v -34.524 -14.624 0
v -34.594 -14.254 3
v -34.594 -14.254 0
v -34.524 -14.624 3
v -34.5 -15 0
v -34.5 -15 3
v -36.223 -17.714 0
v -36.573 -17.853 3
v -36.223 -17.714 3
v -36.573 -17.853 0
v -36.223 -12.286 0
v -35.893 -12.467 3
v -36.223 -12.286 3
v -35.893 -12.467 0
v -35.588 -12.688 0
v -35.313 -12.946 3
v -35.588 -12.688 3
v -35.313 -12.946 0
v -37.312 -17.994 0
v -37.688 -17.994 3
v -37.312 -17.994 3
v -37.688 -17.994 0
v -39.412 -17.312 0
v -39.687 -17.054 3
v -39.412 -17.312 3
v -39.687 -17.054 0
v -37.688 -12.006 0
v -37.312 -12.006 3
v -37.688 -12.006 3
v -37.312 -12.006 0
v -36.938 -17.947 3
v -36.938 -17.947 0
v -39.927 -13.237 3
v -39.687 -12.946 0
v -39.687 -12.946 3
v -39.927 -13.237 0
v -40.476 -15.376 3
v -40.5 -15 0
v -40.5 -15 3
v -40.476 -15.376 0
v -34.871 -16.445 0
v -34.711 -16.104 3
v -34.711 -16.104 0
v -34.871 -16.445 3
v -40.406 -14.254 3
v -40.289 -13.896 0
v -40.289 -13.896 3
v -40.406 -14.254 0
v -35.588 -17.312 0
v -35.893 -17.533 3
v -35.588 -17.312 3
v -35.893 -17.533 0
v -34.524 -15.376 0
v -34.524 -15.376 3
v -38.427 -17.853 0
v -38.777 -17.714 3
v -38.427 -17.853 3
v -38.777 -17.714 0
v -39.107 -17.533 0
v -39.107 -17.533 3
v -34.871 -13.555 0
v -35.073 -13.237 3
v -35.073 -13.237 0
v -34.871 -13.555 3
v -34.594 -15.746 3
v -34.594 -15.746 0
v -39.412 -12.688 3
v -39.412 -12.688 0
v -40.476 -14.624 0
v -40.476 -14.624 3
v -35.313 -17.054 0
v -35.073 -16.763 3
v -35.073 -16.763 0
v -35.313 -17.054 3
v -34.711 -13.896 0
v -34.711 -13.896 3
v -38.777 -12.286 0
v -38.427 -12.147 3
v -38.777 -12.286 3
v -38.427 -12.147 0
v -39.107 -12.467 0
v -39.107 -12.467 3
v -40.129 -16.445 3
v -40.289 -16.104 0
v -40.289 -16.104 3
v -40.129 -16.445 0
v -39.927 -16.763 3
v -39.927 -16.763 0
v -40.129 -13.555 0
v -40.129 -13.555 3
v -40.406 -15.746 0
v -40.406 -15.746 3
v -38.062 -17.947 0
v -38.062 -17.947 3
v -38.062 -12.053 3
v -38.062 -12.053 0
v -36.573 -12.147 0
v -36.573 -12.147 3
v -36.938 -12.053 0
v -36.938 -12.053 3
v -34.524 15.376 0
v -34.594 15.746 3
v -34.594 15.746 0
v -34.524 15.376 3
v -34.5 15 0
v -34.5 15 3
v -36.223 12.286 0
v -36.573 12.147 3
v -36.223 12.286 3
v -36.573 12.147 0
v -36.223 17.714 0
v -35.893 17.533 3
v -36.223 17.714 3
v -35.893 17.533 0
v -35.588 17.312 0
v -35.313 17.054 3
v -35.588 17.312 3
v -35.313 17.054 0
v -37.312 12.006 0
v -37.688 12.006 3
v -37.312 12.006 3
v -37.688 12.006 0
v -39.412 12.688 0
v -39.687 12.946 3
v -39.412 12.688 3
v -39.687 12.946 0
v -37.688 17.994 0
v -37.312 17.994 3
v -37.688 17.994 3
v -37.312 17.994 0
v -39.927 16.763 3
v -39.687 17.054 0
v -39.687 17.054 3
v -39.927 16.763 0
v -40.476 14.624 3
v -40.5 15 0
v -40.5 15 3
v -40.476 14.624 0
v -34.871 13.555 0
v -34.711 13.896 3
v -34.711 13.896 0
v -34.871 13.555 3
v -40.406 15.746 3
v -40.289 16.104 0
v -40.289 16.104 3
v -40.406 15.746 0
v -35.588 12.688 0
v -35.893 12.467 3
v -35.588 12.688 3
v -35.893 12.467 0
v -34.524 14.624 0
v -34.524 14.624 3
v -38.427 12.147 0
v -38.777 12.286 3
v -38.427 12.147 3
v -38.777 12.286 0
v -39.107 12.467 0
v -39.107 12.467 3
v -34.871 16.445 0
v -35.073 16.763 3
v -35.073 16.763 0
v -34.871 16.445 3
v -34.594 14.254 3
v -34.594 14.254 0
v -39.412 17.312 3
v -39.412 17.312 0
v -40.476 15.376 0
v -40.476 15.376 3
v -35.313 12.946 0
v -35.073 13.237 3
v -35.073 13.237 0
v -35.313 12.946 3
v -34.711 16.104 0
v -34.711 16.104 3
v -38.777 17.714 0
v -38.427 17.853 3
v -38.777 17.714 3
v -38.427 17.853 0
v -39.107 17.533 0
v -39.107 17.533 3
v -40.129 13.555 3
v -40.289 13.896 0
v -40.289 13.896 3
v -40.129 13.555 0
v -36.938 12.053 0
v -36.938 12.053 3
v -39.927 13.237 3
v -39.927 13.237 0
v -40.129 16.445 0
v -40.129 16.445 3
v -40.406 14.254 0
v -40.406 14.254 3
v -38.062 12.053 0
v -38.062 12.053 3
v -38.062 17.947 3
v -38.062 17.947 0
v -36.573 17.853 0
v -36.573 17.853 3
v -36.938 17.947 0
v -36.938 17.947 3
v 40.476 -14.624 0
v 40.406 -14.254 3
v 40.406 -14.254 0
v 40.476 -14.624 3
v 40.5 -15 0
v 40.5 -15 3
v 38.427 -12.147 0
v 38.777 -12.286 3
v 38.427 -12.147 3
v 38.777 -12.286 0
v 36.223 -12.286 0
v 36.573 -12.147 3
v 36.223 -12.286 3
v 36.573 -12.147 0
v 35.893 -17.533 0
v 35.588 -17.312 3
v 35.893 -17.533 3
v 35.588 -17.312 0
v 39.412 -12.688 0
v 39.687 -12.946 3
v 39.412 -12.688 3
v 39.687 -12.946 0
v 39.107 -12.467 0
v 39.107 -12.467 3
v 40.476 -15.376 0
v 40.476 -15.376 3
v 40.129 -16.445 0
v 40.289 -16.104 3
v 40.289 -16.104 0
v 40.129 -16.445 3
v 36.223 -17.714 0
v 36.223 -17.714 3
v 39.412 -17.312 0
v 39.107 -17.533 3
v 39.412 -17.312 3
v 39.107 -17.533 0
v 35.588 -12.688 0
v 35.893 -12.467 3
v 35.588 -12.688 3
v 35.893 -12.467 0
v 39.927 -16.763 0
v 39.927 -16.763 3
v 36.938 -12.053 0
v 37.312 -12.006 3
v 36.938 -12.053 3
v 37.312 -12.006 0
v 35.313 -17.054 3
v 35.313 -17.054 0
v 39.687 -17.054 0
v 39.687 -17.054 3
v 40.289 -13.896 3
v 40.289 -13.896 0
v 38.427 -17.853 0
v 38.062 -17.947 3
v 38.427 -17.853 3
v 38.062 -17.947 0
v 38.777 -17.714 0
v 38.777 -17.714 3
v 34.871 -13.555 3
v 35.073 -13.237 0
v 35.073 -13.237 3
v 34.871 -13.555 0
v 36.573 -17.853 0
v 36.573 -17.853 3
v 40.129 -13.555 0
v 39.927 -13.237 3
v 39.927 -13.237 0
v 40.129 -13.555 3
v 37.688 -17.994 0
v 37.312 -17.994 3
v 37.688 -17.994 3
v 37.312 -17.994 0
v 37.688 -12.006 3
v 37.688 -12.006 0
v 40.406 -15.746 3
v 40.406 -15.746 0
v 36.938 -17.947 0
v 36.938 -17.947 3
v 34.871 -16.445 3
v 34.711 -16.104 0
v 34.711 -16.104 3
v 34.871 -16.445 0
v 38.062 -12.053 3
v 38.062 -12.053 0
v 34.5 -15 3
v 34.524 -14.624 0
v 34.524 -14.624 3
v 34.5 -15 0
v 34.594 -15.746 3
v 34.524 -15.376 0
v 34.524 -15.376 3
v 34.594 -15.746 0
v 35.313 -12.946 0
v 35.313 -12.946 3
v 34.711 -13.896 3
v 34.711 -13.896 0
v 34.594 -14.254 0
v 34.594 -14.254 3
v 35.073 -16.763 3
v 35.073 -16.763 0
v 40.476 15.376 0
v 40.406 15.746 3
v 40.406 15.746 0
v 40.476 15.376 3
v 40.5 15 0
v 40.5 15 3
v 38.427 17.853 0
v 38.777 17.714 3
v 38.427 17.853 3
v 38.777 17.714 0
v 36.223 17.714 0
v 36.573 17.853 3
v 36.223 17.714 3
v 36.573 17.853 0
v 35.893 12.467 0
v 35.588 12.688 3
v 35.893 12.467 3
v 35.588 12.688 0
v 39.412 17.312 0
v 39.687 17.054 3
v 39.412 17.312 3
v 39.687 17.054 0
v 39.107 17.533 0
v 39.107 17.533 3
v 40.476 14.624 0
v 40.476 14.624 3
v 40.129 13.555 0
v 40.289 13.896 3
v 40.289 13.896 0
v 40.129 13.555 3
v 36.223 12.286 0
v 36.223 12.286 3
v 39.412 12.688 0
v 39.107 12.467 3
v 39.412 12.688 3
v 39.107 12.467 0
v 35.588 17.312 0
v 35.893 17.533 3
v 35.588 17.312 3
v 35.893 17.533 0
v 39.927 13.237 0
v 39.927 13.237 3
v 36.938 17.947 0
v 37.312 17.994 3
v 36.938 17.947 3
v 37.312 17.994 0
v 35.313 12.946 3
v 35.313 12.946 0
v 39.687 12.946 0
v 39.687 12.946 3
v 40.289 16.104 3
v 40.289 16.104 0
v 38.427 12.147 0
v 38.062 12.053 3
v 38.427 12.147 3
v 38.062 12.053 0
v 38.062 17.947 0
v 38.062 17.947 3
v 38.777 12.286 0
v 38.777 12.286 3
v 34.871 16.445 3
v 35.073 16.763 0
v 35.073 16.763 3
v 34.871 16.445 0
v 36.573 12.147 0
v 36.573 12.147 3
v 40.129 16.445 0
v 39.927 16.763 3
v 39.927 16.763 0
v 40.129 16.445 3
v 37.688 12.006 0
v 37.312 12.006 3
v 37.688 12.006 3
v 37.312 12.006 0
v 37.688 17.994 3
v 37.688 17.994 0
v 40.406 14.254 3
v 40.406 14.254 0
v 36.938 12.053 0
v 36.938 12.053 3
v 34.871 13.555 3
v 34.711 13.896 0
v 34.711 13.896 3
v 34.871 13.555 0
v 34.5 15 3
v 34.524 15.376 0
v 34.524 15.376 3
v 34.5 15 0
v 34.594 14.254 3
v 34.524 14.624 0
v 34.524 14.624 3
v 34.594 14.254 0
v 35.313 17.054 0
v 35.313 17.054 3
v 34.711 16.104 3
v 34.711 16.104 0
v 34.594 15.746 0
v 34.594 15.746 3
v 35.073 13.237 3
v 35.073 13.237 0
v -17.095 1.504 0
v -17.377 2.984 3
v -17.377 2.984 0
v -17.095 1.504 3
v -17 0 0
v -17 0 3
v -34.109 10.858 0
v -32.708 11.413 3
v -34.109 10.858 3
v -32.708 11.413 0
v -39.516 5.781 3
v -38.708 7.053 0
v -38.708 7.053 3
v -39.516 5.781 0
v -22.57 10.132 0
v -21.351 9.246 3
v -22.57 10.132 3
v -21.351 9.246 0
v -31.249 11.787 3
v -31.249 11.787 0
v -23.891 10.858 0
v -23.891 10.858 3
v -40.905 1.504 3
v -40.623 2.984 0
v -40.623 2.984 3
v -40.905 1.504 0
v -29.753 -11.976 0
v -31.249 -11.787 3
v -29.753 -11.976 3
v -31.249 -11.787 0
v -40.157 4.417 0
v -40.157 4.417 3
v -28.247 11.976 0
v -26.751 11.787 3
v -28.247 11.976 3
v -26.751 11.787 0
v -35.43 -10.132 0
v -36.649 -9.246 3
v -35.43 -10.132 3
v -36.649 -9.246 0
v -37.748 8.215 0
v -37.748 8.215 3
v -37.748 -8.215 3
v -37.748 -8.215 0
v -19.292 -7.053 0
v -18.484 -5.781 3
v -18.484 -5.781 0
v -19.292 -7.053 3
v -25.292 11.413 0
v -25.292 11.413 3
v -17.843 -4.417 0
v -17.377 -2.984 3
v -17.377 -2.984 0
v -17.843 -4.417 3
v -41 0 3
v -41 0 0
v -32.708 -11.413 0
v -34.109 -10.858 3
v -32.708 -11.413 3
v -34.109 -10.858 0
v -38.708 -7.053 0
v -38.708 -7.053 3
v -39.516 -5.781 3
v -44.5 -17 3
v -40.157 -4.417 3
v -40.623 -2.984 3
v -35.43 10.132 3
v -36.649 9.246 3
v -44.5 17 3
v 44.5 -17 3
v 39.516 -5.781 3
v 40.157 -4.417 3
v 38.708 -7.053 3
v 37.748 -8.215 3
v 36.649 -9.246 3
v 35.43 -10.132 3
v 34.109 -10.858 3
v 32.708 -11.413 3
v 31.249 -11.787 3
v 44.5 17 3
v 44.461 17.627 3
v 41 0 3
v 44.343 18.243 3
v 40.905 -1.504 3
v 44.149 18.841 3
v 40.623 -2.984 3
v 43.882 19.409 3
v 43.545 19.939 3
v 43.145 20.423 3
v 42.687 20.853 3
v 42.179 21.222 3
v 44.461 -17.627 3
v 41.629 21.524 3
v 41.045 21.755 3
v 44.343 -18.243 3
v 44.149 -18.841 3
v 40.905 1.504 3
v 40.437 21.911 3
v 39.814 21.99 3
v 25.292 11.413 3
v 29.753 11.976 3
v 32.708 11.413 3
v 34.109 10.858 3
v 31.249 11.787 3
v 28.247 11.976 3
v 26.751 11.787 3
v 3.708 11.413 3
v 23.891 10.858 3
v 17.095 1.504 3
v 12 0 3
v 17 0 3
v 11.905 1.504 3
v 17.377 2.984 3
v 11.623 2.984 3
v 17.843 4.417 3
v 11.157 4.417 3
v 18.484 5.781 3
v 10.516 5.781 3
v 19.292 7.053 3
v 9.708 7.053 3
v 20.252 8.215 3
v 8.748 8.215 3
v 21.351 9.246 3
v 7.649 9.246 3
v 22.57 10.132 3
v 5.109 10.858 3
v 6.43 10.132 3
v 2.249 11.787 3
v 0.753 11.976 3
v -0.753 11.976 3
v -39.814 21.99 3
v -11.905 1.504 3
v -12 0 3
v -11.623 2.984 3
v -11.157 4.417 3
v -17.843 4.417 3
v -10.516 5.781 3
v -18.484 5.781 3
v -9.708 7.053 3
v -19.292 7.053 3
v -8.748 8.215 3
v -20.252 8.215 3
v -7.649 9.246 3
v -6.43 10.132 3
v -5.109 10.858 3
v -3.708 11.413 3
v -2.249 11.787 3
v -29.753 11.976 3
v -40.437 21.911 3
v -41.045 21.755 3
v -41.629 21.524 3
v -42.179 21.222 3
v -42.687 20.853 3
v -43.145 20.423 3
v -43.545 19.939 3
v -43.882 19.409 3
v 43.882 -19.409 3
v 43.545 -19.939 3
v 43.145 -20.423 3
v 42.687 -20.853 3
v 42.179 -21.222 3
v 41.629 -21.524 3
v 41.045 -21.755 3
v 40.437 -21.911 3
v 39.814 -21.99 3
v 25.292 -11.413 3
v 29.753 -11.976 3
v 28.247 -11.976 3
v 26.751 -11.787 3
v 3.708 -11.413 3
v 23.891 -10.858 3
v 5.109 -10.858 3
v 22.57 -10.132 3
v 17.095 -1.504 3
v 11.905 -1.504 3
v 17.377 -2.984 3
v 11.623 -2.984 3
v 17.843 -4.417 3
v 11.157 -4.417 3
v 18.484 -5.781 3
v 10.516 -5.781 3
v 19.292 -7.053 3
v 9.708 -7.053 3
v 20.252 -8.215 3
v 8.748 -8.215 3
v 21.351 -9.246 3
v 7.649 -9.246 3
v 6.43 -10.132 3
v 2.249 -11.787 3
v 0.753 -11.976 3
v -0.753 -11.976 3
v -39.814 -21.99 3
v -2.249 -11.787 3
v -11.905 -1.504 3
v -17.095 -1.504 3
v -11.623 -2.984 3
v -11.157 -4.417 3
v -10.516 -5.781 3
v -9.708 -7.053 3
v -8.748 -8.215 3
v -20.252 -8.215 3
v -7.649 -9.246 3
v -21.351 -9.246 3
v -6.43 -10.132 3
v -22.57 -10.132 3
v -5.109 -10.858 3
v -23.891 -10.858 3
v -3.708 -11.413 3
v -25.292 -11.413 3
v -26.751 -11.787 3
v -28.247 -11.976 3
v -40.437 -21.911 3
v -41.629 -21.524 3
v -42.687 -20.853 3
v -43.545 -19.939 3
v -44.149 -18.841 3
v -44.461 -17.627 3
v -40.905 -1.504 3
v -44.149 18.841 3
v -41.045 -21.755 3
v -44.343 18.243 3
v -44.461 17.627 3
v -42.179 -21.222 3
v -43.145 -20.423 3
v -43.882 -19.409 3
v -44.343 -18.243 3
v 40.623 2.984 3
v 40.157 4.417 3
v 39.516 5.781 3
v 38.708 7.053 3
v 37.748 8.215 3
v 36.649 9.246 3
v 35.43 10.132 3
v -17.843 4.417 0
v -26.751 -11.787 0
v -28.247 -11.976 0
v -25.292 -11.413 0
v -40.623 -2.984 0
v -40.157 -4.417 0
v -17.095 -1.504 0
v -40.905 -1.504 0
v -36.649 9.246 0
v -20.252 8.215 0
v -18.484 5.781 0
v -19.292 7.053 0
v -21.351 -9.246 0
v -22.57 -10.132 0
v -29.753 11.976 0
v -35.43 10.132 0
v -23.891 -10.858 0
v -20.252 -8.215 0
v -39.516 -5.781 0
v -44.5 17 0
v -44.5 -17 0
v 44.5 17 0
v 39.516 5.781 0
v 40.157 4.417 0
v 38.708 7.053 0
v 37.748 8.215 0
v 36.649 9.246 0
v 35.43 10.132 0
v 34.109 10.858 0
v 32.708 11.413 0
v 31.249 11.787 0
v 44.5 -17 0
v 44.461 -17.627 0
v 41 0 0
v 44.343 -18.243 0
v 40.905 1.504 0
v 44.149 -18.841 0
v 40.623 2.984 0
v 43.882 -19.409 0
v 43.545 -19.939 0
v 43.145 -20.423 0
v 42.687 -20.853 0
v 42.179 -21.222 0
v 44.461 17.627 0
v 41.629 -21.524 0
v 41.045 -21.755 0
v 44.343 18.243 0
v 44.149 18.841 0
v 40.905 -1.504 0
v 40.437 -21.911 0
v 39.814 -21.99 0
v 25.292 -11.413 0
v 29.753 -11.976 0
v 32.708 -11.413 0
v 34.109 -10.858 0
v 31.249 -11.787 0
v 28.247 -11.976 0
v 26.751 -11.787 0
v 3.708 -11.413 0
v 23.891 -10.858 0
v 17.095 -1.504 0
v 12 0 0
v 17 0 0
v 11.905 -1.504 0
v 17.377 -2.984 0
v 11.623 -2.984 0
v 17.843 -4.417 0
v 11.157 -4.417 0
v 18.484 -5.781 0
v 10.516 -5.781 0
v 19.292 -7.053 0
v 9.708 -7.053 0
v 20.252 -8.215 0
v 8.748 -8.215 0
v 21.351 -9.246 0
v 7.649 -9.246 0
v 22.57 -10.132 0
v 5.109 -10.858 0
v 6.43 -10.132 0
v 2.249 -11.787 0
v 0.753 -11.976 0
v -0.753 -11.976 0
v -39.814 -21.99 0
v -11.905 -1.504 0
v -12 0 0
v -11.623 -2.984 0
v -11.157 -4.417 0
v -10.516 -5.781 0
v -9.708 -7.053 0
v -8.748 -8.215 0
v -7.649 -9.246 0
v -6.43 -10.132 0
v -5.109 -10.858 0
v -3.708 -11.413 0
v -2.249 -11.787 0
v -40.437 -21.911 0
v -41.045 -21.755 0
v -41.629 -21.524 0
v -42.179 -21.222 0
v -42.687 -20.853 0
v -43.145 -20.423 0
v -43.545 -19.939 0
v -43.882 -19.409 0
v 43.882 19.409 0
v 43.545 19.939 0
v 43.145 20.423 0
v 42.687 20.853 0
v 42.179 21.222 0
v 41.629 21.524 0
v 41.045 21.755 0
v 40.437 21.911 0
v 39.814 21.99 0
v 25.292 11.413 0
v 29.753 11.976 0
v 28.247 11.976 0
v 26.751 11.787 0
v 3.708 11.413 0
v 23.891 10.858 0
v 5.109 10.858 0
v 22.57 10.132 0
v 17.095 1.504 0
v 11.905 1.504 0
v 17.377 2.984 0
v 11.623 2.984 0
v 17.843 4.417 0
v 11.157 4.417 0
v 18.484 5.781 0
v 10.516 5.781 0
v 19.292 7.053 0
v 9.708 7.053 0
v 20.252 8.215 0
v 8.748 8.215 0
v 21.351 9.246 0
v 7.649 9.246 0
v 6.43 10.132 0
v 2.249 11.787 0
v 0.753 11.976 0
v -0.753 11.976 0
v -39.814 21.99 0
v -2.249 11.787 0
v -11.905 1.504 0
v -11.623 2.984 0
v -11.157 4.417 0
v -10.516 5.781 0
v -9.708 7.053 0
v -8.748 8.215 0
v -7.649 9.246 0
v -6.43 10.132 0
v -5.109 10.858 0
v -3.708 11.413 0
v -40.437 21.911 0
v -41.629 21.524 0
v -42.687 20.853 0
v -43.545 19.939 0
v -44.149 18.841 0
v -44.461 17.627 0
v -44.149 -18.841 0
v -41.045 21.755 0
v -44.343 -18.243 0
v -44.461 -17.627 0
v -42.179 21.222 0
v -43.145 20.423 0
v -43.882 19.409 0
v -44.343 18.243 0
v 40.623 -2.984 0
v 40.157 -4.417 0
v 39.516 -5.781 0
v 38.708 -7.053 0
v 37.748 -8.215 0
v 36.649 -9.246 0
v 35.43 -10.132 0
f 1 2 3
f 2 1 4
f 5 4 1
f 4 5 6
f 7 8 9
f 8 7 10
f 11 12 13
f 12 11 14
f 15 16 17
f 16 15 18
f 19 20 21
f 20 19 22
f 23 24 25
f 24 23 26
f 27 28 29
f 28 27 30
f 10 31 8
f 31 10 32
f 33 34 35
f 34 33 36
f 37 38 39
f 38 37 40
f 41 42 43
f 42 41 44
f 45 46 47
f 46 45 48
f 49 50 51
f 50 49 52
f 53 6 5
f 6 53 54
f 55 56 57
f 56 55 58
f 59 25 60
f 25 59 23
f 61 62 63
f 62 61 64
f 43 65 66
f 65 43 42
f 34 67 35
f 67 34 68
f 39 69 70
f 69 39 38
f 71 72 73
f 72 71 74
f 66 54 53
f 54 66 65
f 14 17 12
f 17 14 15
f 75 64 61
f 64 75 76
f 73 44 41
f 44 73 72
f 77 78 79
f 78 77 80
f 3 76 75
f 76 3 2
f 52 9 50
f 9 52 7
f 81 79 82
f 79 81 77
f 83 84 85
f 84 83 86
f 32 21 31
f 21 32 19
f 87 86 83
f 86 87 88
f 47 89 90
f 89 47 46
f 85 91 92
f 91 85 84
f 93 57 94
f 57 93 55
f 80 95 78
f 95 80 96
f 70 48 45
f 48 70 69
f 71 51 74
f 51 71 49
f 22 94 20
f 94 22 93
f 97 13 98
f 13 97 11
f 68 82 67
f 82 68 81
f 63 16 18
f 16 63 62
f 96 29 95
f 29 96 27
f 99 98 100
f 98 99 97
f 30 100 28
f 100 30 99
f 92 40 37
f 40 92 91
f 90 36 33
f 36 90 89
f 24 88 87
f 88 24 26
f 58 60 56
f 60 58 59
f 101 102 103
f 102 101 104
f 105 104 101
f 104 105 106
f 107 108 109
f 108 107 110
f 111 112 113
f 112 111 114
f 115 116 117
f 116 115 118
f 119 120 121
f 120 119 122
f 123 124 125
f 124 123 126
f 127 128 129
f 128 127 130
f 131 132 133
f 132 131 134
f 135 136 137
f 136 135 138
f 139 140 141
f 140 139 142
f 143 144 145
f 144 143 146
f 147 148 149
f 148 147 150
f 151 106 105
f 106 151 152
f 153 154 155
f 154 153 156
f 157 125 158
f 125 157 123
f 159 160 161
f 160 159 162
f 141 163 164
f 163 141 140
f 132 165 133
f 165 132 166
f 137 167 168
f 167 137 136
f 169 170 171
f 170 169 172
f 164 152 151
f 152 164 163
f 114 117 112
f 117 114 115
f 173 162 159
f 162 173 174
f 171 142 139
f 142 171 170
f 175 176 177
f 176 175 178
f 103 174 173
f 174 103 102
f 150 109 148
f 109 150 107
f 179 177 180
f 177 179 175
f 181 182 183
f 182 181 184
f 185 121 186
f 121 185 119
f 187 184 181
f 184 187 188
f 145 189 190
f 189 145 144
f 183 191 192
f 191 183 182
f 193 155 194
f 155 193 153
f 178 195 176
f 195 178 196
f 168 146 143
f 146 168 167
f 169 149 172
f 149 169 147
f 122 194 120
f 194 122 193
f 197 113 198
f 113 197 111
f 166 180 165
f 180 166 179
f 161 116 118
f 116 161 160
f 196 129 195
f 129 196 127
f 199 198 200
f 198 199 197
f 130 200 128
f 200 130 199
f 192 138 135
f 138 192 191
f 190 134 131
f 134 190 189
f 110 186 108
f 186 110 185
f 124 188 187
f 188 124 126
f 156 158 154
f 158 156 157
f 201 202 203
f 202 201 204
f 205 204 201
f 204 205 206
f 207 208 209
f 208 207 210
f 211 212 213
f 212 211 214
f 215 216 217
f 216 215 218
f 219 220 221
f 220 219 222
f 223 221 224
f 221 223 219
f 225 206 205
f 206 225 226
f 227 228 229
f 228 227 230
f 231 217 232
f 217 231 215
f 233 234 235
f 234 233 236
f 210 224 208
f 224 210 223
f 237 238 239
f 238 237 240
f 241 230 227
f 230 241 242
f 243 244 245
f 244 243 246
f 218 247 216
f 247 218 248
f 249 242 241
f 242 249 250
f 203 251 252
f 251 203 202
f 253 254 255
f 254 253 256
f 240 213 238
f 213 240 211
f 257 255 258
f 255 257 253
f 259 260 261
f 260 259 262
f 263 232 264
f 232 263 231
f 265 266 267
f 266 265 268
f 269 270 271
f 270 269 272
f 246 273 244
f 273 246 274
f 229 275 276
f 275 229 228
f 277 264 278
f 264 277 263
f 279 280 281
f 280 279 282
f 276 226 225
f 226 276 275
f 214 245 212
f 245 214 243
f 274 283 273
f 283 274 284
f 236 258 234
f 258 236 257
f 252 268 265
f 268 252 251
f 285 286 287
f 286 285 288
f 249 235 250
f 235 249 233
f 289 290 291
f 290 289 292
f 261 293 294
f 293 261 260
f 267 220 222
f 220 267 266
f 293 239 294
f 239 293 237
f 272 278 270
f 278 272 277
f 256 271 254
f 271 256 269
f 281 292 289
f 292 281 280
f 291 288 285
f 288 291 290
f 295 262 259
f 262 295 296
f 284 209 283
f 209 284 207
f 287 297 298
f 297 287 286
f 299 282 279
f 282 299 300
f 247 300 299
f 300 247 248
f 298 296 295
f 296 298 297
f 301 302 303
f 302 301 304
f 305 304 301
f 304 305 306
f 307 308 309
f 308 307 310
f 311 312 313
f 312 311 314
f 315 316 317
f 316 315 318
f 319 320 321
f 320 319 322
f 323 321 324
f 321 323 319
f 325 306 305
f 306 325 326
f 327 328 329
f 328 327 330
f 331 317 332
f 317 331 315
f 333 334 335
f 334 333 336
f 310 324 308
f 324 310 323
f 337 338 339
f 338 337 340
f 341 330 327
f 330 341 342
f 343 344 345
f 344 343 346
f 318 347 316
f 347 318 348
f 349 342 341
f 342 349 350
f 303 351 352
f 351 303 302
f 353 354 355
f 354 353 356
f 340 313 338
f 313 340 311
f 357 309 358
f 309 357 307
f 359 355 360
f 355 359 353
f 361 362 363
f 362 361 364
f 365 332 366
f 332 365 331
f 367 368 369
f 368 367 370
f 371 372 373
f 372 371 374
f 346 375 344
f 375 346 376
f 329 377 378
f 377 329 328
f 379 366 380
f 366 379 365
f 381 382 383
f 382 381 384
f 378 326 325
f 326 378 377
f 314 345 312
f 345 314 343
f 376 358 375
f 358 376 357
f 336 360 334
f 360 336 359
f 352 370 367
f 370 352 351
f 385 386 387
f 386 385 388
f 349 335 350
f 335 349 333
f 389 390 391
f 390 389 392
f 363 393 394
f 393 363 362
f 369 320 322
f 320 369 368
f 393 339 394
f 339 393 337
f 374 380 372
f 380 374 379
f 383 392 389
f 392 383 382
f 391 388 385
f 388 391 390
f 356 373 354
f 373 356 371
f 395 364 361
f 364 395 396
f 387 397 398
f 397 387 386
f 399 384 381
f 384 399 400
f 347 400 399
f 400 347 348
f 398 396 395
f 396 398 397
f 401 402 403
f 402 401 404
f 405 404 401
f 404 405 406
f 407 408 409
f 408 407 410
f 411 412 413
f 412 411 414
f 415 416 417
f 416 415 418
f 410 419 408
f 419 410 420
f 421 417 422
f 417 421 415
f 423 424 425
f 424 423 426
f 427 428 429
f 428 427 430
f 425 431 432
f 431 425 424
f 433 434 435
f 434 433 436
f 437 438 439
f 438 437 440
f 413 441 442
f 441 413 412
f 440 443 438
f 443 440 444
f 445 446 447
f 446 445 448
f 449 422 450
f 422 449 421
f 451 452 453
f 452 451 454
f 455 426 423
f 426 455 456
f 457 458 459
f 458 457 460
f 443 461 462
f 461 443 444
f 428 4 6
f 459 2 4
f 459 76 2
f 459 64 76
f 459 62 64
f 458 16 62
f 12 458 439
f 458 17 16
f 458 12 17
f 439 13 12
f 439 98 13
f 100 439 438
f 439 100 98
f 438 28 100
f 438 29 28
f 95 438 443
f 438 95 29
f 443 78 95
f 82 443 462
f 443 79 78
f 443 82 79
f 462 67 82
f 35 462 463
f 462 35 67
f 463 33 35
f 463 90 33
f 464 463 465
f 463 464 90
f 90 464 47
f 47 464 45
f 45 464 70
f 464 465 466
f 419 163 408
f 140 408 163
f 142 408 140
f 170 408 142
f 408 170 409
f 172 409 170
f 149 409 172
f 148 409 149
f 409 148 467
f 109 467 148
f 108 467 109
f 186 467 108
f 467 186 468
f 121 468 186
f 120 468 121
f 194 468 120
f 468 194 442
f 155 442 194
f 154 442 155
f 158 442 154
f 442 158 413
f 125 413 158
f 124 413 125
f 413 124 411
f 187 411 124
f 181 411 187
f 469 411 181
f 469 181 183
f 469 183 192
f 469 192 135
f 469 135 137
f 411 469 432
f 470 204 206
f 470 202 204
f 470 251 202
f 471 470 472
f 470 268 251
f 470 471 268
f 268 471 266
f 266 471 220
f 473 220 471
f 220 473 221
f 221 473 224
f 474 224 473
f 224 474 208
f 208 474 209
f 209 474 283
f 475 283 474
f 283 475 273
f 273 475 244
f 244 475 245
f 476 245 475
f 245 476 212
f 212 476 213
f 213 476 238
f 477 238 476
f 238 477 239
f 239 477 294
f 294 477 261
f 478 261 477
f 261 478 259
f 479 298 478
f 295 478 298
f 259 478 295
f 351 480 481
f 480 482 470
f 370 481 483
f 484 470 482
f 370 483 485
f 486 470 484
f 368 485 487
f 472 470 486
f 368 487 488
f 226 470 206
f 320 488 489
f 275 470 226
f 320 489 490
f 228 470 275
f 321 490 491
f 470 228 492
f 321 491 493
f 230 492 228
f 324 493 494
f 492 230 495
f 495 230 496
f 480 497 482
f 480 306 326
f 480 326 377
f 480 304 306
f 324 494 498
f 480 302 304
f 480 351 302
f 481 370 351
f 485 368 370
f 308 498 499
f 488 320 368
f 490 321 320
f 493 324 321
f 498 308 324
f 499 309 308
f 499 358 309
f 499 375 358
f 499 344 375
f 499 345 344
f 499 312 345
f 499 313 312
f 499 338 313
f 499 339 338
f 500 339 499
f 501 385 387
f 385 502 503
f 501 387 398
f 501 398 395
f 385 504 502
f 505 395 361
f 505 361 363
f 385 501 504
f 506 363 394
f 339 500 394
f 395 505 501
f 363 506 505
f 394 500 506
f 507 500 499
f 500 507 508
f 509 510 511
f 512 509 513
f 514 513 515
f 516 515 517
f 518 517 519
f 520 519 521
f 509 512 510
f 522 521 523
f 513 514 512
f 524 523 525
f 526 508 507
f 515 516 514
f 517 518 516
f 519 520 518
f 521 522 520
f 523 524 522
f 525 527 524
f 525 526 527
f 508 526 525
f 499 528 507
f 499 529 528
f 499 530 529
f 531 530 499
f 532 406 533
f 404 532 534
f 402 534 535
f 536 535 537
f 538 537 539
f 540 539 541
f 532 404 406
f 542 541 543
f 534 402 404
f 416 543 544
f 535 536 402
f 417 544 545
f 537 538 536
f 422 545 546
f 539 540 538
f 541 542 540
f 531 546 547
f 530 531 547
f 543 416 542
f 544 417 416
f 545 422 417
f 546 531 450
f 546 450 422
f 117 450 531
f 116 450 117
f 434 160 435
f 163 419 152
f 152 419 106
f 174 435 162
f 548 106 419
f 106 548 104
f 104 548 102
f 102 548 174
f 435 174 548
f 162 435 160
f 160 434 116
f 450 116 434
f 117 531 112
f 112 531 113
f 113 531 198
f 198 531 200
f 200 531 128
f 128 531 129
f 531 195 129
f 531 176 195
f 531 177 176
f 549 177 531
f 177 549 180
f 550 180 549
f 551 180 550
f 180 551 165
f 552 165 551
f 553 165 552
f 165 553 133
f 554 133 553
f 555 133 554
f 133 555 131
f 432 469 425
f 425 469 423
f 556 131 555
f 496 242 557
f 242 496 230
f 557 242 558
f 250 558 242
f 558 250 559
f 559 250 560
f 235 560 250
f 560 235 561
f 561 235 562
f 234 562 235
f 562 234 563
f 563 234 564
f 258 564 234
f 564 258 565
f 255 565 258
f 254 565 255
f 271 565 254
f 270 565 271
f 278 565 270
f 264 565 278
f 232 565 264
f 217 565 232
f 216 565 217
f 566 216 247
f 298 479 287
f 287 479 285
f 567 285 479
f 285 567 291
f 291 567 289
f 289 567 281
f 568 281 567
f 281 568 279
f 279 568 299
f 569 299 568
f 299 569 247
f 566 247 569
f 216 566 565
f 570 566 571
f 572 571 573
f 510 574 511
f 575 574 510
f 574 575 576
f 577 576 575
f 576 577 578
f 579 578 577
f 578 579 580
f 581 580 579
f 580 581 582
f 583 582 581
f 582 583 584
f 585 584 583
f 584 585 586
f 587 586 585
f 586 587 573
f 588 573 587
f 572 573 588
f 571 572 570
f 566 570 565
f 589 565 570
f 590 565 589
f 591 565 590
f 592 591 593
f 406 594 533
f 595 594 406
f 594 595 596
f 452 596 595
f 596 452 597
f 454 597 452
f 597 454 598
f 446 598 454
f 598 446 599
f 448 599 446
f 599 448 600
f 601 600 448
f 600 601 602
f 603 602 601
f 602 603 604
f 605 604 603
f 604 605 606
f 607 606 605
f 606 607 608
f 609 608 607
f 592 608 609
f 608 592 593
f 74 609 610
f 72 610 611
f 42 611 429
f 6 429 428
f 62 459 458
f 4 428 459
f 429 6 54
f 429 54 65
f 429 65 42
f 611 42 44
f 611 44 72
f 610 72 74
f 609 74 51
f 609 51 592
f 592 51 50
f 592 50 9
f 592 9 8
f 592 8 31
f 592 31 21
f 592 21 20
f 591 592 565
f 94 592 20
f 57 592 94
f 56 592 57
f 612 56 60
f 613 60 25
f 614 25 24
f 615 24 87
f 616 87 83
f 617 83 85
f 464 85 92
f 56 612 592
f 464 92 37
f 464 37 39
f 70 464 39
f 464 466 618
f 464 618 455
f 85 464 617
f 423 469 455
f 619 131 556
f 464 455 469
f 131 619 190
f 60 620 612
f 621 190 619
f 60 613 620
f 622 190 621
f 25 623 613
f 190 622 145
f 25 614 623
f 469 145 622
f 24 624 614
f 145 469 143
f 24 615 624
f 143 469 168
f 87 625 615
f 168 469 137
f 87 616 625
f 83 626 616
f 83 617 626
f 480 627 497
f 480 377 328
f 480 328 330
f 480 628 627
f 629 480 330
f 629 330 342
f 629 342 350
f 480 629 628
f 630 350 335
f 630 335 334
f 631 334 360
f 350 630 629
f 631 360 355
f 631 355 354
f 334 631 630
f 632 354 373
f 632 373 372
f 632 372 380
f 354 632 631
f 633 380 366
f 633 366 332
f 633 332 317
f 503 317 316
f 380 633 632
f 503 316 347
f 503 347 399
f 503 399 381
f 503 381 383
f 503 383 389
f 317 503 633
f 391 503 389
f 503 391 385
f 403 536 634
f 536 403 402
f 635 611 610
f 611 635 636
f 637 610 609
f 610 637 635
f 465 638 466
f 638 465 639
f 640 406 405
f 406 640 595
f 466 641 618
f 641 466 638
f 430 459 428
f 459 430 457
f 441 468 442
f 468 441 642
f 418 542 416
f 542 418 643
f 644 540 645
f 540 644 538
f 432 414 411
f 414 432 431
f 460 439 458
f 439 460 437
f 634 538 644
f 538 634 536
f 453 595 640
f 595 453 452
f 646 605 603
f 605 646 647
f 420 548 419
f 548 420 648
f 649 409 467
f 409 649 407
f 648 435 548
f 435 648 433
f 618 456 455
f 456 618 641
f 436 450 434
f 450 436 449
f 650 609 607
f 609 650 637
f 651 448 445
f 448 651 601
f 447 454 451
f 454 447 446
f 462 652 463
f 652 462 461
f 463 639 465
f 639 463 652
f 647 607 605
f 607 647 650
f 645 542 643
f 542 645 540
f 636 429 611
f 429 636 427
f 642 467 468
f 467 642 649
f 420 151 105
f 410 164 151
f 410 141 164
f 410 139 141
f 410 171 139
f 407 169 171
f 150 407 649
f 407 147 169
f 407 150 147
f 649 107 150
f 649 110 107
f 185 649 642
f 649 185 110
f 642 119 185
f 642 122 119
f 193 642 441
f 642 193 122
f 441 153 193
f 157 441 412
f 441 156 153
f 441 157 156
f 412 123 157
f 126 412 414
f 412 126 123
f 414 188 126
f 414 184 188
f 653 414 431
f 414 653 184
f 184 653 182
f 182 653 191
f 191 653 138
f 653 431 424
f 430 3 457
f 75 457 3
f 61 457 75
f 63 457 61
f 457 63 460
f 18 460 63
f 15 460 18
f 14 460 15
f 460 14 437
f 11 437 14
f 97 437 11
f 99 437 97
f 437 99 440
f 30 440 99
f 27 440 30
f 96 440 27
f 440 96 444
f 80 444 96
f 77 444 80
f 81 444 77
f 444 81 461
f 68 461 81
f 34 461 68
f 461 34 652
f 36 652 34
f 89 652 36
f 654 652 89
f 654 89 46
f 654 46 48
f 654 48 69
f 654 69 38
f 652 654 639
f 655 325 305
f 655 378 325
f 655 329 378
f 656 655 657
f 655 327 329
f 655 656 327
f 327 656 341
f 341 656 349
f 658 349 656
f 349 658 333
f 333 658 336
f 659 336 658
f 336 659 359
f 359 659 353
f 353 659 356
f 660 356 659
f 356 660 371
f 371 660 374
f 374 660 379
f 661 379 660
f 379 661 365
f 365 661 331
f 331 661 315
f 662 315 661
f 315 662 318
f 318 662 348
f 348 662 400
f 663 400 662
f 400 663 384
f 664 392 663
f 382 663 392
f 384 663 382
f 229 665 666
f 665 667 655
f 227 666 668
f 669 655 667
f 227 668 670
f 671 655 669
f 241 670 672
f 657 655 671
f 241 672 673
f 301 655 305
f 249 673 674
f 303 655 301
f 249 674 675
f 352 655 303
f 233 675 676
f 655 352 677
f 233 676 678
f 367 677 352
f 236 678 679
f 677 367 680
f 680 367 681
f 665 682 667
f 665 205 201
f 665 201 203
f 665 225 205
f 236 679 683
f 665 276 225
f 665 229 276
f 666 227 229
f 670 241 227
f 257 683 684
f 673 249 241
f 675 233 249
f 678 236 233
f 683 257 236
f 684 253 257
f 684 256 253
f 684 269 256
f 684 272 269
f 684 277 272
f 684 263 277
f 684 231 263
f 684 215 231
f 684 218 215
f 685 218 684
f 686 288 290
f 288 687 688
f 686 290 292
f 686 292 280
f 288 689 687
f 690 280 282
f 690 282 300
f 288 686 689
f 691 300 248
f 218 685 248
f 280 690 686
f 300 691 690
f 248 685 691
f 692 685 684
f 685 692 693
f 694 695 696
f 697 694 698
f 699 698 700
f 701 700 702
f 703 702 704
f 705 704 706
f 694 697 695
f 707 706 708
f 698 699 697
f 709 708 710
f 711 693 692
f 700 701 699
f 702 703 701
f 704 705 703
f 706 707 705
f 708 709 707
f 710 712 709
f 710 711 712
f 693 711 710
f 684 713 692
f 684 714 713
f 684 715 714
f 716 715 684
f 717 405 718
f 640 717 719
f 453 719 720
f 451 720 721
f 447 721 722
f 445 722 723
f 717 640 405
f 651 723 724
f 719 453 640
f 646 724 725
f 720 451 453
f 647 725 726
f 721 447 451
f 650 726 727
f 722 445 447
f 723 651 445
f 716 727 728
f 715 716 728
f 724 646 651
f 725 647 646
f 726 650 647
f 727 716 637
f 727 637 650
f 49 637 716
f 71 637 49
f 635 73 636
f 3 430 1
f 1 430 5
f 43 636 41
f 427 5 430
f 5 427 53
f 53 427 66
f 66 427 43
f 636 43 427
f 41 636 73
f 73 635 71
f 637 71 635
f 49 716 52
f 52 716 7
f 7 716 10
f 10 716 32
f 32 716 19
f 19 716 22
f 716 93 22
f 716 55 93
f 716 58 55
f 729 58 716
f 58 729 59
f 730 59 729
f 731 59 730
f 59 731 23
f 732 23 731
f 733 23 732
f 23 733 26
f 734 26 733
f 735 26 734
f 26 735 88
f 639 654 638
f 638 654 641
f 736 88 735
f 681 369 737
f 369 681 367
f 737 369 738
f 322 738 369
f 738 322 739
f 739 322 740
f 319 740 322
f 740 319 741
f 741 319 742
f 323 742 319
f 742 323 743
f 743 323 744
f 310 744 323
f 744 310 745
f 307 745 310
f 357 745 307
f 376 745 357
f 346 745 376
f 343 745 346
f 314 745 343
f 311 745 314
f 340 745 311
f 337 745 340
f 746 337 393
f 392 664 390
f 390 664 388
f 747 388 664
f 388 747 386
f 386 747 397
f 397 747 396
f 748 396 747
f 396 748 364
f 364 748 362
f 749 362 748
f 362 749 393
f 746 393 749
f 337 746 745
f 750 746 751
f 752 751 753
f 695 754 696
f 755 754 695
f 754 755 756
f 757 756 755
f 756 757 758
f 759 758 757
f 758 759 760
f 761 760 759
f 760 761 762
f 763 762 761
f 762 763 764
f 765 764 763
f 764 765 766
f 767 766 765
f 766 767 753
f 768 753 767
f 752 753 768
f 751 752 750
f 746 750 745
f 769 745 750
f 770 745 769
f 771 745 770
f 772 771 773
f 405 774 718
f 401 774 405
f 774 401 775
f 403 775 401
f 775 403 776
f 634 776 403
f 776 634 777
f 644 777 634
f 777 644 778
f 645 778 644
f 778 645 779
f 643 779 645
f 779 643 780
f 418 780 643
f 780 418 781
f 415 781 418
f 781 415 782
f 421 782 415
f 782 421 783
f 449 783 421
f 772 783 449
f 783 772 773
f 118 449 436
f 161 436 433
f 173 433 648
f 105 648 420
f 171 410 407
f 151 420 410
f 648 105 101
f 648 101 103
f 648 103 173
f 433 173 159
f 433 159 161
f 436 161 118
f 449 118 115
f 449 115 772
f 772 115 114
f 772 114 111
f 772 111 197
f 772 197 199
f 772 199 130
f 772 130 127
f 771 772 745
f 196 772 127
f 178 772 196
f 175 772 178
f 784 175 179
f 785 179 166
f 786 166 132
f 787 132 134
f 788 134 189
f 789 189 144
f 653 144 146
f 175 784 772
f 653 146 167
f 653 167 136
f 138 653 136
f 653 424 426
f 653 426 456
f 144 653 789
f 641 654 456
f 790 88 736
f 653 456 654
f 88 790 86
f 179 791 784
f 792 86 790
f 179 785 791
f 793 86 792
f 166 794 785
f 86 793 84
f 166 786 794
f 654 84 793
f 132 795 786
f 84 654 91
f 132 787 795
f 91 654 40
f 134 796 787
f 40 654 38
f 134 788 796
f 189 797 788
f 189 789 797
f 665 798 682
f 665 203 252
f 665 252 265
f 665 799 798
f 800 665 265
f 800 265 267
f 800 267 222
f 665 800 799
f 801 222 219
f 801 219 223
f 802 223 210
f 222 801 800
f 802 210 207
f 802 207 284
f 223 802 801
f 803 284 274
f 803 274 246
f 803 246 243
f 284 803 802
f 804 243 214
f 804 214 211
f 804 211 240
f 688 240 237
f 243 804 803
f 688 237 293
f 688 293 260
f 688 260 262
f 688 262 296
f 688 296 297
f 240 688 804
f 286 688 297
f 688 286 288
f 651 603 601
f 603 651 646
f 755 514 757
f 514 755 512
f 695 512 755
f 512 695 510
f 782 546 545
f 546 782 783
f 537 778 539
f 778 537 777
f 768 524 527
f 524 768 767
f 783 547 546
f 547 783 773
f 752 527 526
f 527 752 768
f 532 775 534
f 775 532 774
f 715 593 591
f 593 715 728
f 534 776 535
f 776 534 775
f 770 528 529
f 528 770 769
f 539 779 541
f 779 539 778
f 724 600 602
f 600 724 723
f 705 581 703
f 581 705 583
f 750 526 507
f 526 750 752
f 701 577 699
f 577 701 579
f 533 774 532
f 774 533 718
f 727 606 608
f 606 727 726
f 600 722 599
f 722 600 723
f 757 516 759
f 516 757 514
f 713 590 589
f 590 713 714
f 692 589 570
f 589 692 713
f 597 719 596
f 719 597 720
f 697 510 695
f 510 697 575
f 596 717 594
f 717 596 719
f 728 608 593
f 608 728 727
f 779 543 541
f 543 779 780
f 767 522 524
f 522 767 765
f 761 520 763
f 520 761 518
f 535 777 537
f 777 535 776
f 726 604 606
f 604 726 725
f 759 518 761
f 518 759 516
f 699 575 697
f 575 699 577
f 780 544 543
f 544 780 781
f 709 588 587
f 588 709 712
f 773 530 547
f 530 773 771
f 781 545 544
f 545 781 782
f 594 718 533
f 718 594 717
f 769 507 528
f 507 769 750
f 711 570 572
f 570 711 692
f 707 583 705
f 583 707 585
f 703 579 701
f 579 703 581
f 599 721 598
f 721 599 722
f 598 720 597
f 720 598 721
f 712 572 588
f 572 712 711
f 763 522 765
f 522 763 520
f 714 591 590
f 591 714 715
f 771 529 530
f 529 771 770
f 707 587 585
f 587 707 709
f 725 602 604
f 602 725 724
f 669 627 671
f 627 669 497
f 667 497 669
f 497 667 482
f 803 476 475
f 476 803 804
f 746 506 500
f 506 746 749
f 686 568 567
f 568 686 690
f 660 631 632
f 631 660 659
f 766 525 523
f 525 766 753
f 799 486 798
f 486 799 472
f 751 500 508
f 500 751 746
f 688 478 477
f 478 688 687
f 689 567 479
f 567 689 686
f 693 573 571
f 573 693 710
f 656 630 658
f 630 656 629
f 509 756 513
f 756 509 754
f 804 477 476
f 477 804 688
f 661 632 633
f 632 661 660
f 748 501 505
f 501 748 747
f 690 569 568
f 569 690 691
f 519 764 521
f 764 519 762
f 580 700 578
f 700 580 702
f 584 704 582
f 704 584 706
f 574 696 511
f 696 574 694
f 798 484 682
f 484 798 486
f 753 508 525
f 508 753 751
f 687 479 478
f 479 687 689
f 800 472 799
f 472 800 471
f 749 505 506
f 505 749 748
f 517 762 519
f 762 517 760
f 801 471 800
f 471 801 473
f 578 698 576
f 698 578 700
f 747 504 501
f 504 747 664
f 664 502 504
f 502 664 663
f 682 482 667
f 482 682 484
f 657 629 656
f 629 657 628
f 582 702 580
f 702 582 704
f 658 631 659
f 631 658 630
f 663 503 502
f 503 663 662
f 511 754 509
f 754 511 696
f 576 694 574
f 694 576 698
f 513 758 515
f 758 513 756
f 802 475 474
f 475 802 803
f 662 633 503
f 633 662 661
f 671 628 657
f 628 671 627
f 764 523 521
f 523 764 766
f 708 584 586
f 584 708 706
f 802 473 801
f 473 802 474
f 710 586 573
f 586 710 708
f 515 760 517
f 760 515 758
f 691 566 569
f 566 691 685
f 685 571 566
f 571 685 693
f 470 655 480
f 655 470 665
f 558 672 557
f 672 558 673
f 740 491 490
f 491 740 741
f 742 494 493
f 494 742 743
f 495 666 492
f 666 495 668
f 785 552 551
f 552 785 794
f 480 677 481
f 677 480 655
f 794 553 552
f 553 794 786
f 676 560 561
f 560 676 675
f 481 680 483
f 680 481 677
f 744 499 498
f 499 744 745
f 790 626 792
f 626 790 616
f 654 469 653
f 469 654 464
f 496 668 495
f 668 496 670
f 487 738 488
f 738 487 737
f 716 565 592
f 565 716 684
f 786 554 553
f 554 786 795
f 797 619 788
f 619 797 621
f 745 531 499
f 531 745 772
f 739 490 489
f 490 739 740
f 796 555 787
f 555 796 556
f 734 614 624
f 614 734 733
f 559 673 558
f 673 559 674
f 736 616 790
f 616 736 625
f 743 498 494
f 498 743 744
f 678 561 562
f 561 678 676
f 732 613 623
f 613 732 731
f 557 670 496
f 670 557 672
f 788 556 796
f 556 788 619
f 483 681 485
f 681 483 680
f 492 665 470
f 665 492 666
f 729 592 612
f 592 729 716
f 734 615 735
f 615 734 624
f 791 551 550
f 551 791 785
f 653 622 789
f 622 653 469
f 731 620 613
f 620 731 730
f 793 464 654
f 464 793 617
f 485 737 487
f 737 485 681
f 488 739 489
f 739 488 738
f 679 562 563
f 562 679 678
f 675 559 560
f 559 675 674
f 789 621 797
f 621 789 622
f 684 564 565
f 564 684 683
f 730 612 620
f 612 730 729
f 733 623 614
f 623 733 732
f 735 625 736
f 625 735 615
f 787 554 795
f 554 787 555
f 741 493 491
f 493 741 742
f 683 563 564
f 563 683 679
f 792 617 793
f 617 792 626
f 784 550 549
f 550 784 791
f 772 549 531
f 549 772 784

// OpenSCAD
$fn = 50;


difference() {
	union() {
		hull() {
			translate(v = [-39.5000000000, 17.0000000000, 0]) {
				cylinder(h = 3, r = 5);
			}
			translate(v = [39.5000000000, 17.0000000000, 0]) {
				cylinder(h = 3, r = 5);
			}
			translate(v = [-39.5000000000, -17.0000000000, 0]) {
				cylinder(h = 3, r = 5);
			}
			translate(v = [39.5000000000, -17.0000000000, 0]) {
				cylinder(h = 3, r = 5);
			}
		}
	}
	union() {
		#translate(v = [-37.5000000000, -15.0000000000, -100.0000000000]) {
			cylinder(h = 200, r = 3.0000000000);
		}
		#translate(v = [-37.5000000000, 15.0000000000, -100.0000000000]) {
			cylinder(h = 200, r = 3.0000000000);
		}
		#translate(v = [37.5000000000, -15.0000000000, -100.0000000000]) {
			cylinder(h = 200, r = 3.0000000000);
		}
		#translate(v = [37.5000000000, 15.0000000000, -100.0000000000]) {
			cylinder(h = 200, r = 3.0000000000);
		}
		#translate(v = [-29.0000000000, 0, 0]) {
			cylinder(h = 3, r = 12.0000000000);
		}
		#cylinder(h = 3, r = 12.0000000000);
		#translate(v = [29.0000000000, 0, 0]) {
			cylinder(h = 3, r = 12.0000000000);
		}
	}
}
